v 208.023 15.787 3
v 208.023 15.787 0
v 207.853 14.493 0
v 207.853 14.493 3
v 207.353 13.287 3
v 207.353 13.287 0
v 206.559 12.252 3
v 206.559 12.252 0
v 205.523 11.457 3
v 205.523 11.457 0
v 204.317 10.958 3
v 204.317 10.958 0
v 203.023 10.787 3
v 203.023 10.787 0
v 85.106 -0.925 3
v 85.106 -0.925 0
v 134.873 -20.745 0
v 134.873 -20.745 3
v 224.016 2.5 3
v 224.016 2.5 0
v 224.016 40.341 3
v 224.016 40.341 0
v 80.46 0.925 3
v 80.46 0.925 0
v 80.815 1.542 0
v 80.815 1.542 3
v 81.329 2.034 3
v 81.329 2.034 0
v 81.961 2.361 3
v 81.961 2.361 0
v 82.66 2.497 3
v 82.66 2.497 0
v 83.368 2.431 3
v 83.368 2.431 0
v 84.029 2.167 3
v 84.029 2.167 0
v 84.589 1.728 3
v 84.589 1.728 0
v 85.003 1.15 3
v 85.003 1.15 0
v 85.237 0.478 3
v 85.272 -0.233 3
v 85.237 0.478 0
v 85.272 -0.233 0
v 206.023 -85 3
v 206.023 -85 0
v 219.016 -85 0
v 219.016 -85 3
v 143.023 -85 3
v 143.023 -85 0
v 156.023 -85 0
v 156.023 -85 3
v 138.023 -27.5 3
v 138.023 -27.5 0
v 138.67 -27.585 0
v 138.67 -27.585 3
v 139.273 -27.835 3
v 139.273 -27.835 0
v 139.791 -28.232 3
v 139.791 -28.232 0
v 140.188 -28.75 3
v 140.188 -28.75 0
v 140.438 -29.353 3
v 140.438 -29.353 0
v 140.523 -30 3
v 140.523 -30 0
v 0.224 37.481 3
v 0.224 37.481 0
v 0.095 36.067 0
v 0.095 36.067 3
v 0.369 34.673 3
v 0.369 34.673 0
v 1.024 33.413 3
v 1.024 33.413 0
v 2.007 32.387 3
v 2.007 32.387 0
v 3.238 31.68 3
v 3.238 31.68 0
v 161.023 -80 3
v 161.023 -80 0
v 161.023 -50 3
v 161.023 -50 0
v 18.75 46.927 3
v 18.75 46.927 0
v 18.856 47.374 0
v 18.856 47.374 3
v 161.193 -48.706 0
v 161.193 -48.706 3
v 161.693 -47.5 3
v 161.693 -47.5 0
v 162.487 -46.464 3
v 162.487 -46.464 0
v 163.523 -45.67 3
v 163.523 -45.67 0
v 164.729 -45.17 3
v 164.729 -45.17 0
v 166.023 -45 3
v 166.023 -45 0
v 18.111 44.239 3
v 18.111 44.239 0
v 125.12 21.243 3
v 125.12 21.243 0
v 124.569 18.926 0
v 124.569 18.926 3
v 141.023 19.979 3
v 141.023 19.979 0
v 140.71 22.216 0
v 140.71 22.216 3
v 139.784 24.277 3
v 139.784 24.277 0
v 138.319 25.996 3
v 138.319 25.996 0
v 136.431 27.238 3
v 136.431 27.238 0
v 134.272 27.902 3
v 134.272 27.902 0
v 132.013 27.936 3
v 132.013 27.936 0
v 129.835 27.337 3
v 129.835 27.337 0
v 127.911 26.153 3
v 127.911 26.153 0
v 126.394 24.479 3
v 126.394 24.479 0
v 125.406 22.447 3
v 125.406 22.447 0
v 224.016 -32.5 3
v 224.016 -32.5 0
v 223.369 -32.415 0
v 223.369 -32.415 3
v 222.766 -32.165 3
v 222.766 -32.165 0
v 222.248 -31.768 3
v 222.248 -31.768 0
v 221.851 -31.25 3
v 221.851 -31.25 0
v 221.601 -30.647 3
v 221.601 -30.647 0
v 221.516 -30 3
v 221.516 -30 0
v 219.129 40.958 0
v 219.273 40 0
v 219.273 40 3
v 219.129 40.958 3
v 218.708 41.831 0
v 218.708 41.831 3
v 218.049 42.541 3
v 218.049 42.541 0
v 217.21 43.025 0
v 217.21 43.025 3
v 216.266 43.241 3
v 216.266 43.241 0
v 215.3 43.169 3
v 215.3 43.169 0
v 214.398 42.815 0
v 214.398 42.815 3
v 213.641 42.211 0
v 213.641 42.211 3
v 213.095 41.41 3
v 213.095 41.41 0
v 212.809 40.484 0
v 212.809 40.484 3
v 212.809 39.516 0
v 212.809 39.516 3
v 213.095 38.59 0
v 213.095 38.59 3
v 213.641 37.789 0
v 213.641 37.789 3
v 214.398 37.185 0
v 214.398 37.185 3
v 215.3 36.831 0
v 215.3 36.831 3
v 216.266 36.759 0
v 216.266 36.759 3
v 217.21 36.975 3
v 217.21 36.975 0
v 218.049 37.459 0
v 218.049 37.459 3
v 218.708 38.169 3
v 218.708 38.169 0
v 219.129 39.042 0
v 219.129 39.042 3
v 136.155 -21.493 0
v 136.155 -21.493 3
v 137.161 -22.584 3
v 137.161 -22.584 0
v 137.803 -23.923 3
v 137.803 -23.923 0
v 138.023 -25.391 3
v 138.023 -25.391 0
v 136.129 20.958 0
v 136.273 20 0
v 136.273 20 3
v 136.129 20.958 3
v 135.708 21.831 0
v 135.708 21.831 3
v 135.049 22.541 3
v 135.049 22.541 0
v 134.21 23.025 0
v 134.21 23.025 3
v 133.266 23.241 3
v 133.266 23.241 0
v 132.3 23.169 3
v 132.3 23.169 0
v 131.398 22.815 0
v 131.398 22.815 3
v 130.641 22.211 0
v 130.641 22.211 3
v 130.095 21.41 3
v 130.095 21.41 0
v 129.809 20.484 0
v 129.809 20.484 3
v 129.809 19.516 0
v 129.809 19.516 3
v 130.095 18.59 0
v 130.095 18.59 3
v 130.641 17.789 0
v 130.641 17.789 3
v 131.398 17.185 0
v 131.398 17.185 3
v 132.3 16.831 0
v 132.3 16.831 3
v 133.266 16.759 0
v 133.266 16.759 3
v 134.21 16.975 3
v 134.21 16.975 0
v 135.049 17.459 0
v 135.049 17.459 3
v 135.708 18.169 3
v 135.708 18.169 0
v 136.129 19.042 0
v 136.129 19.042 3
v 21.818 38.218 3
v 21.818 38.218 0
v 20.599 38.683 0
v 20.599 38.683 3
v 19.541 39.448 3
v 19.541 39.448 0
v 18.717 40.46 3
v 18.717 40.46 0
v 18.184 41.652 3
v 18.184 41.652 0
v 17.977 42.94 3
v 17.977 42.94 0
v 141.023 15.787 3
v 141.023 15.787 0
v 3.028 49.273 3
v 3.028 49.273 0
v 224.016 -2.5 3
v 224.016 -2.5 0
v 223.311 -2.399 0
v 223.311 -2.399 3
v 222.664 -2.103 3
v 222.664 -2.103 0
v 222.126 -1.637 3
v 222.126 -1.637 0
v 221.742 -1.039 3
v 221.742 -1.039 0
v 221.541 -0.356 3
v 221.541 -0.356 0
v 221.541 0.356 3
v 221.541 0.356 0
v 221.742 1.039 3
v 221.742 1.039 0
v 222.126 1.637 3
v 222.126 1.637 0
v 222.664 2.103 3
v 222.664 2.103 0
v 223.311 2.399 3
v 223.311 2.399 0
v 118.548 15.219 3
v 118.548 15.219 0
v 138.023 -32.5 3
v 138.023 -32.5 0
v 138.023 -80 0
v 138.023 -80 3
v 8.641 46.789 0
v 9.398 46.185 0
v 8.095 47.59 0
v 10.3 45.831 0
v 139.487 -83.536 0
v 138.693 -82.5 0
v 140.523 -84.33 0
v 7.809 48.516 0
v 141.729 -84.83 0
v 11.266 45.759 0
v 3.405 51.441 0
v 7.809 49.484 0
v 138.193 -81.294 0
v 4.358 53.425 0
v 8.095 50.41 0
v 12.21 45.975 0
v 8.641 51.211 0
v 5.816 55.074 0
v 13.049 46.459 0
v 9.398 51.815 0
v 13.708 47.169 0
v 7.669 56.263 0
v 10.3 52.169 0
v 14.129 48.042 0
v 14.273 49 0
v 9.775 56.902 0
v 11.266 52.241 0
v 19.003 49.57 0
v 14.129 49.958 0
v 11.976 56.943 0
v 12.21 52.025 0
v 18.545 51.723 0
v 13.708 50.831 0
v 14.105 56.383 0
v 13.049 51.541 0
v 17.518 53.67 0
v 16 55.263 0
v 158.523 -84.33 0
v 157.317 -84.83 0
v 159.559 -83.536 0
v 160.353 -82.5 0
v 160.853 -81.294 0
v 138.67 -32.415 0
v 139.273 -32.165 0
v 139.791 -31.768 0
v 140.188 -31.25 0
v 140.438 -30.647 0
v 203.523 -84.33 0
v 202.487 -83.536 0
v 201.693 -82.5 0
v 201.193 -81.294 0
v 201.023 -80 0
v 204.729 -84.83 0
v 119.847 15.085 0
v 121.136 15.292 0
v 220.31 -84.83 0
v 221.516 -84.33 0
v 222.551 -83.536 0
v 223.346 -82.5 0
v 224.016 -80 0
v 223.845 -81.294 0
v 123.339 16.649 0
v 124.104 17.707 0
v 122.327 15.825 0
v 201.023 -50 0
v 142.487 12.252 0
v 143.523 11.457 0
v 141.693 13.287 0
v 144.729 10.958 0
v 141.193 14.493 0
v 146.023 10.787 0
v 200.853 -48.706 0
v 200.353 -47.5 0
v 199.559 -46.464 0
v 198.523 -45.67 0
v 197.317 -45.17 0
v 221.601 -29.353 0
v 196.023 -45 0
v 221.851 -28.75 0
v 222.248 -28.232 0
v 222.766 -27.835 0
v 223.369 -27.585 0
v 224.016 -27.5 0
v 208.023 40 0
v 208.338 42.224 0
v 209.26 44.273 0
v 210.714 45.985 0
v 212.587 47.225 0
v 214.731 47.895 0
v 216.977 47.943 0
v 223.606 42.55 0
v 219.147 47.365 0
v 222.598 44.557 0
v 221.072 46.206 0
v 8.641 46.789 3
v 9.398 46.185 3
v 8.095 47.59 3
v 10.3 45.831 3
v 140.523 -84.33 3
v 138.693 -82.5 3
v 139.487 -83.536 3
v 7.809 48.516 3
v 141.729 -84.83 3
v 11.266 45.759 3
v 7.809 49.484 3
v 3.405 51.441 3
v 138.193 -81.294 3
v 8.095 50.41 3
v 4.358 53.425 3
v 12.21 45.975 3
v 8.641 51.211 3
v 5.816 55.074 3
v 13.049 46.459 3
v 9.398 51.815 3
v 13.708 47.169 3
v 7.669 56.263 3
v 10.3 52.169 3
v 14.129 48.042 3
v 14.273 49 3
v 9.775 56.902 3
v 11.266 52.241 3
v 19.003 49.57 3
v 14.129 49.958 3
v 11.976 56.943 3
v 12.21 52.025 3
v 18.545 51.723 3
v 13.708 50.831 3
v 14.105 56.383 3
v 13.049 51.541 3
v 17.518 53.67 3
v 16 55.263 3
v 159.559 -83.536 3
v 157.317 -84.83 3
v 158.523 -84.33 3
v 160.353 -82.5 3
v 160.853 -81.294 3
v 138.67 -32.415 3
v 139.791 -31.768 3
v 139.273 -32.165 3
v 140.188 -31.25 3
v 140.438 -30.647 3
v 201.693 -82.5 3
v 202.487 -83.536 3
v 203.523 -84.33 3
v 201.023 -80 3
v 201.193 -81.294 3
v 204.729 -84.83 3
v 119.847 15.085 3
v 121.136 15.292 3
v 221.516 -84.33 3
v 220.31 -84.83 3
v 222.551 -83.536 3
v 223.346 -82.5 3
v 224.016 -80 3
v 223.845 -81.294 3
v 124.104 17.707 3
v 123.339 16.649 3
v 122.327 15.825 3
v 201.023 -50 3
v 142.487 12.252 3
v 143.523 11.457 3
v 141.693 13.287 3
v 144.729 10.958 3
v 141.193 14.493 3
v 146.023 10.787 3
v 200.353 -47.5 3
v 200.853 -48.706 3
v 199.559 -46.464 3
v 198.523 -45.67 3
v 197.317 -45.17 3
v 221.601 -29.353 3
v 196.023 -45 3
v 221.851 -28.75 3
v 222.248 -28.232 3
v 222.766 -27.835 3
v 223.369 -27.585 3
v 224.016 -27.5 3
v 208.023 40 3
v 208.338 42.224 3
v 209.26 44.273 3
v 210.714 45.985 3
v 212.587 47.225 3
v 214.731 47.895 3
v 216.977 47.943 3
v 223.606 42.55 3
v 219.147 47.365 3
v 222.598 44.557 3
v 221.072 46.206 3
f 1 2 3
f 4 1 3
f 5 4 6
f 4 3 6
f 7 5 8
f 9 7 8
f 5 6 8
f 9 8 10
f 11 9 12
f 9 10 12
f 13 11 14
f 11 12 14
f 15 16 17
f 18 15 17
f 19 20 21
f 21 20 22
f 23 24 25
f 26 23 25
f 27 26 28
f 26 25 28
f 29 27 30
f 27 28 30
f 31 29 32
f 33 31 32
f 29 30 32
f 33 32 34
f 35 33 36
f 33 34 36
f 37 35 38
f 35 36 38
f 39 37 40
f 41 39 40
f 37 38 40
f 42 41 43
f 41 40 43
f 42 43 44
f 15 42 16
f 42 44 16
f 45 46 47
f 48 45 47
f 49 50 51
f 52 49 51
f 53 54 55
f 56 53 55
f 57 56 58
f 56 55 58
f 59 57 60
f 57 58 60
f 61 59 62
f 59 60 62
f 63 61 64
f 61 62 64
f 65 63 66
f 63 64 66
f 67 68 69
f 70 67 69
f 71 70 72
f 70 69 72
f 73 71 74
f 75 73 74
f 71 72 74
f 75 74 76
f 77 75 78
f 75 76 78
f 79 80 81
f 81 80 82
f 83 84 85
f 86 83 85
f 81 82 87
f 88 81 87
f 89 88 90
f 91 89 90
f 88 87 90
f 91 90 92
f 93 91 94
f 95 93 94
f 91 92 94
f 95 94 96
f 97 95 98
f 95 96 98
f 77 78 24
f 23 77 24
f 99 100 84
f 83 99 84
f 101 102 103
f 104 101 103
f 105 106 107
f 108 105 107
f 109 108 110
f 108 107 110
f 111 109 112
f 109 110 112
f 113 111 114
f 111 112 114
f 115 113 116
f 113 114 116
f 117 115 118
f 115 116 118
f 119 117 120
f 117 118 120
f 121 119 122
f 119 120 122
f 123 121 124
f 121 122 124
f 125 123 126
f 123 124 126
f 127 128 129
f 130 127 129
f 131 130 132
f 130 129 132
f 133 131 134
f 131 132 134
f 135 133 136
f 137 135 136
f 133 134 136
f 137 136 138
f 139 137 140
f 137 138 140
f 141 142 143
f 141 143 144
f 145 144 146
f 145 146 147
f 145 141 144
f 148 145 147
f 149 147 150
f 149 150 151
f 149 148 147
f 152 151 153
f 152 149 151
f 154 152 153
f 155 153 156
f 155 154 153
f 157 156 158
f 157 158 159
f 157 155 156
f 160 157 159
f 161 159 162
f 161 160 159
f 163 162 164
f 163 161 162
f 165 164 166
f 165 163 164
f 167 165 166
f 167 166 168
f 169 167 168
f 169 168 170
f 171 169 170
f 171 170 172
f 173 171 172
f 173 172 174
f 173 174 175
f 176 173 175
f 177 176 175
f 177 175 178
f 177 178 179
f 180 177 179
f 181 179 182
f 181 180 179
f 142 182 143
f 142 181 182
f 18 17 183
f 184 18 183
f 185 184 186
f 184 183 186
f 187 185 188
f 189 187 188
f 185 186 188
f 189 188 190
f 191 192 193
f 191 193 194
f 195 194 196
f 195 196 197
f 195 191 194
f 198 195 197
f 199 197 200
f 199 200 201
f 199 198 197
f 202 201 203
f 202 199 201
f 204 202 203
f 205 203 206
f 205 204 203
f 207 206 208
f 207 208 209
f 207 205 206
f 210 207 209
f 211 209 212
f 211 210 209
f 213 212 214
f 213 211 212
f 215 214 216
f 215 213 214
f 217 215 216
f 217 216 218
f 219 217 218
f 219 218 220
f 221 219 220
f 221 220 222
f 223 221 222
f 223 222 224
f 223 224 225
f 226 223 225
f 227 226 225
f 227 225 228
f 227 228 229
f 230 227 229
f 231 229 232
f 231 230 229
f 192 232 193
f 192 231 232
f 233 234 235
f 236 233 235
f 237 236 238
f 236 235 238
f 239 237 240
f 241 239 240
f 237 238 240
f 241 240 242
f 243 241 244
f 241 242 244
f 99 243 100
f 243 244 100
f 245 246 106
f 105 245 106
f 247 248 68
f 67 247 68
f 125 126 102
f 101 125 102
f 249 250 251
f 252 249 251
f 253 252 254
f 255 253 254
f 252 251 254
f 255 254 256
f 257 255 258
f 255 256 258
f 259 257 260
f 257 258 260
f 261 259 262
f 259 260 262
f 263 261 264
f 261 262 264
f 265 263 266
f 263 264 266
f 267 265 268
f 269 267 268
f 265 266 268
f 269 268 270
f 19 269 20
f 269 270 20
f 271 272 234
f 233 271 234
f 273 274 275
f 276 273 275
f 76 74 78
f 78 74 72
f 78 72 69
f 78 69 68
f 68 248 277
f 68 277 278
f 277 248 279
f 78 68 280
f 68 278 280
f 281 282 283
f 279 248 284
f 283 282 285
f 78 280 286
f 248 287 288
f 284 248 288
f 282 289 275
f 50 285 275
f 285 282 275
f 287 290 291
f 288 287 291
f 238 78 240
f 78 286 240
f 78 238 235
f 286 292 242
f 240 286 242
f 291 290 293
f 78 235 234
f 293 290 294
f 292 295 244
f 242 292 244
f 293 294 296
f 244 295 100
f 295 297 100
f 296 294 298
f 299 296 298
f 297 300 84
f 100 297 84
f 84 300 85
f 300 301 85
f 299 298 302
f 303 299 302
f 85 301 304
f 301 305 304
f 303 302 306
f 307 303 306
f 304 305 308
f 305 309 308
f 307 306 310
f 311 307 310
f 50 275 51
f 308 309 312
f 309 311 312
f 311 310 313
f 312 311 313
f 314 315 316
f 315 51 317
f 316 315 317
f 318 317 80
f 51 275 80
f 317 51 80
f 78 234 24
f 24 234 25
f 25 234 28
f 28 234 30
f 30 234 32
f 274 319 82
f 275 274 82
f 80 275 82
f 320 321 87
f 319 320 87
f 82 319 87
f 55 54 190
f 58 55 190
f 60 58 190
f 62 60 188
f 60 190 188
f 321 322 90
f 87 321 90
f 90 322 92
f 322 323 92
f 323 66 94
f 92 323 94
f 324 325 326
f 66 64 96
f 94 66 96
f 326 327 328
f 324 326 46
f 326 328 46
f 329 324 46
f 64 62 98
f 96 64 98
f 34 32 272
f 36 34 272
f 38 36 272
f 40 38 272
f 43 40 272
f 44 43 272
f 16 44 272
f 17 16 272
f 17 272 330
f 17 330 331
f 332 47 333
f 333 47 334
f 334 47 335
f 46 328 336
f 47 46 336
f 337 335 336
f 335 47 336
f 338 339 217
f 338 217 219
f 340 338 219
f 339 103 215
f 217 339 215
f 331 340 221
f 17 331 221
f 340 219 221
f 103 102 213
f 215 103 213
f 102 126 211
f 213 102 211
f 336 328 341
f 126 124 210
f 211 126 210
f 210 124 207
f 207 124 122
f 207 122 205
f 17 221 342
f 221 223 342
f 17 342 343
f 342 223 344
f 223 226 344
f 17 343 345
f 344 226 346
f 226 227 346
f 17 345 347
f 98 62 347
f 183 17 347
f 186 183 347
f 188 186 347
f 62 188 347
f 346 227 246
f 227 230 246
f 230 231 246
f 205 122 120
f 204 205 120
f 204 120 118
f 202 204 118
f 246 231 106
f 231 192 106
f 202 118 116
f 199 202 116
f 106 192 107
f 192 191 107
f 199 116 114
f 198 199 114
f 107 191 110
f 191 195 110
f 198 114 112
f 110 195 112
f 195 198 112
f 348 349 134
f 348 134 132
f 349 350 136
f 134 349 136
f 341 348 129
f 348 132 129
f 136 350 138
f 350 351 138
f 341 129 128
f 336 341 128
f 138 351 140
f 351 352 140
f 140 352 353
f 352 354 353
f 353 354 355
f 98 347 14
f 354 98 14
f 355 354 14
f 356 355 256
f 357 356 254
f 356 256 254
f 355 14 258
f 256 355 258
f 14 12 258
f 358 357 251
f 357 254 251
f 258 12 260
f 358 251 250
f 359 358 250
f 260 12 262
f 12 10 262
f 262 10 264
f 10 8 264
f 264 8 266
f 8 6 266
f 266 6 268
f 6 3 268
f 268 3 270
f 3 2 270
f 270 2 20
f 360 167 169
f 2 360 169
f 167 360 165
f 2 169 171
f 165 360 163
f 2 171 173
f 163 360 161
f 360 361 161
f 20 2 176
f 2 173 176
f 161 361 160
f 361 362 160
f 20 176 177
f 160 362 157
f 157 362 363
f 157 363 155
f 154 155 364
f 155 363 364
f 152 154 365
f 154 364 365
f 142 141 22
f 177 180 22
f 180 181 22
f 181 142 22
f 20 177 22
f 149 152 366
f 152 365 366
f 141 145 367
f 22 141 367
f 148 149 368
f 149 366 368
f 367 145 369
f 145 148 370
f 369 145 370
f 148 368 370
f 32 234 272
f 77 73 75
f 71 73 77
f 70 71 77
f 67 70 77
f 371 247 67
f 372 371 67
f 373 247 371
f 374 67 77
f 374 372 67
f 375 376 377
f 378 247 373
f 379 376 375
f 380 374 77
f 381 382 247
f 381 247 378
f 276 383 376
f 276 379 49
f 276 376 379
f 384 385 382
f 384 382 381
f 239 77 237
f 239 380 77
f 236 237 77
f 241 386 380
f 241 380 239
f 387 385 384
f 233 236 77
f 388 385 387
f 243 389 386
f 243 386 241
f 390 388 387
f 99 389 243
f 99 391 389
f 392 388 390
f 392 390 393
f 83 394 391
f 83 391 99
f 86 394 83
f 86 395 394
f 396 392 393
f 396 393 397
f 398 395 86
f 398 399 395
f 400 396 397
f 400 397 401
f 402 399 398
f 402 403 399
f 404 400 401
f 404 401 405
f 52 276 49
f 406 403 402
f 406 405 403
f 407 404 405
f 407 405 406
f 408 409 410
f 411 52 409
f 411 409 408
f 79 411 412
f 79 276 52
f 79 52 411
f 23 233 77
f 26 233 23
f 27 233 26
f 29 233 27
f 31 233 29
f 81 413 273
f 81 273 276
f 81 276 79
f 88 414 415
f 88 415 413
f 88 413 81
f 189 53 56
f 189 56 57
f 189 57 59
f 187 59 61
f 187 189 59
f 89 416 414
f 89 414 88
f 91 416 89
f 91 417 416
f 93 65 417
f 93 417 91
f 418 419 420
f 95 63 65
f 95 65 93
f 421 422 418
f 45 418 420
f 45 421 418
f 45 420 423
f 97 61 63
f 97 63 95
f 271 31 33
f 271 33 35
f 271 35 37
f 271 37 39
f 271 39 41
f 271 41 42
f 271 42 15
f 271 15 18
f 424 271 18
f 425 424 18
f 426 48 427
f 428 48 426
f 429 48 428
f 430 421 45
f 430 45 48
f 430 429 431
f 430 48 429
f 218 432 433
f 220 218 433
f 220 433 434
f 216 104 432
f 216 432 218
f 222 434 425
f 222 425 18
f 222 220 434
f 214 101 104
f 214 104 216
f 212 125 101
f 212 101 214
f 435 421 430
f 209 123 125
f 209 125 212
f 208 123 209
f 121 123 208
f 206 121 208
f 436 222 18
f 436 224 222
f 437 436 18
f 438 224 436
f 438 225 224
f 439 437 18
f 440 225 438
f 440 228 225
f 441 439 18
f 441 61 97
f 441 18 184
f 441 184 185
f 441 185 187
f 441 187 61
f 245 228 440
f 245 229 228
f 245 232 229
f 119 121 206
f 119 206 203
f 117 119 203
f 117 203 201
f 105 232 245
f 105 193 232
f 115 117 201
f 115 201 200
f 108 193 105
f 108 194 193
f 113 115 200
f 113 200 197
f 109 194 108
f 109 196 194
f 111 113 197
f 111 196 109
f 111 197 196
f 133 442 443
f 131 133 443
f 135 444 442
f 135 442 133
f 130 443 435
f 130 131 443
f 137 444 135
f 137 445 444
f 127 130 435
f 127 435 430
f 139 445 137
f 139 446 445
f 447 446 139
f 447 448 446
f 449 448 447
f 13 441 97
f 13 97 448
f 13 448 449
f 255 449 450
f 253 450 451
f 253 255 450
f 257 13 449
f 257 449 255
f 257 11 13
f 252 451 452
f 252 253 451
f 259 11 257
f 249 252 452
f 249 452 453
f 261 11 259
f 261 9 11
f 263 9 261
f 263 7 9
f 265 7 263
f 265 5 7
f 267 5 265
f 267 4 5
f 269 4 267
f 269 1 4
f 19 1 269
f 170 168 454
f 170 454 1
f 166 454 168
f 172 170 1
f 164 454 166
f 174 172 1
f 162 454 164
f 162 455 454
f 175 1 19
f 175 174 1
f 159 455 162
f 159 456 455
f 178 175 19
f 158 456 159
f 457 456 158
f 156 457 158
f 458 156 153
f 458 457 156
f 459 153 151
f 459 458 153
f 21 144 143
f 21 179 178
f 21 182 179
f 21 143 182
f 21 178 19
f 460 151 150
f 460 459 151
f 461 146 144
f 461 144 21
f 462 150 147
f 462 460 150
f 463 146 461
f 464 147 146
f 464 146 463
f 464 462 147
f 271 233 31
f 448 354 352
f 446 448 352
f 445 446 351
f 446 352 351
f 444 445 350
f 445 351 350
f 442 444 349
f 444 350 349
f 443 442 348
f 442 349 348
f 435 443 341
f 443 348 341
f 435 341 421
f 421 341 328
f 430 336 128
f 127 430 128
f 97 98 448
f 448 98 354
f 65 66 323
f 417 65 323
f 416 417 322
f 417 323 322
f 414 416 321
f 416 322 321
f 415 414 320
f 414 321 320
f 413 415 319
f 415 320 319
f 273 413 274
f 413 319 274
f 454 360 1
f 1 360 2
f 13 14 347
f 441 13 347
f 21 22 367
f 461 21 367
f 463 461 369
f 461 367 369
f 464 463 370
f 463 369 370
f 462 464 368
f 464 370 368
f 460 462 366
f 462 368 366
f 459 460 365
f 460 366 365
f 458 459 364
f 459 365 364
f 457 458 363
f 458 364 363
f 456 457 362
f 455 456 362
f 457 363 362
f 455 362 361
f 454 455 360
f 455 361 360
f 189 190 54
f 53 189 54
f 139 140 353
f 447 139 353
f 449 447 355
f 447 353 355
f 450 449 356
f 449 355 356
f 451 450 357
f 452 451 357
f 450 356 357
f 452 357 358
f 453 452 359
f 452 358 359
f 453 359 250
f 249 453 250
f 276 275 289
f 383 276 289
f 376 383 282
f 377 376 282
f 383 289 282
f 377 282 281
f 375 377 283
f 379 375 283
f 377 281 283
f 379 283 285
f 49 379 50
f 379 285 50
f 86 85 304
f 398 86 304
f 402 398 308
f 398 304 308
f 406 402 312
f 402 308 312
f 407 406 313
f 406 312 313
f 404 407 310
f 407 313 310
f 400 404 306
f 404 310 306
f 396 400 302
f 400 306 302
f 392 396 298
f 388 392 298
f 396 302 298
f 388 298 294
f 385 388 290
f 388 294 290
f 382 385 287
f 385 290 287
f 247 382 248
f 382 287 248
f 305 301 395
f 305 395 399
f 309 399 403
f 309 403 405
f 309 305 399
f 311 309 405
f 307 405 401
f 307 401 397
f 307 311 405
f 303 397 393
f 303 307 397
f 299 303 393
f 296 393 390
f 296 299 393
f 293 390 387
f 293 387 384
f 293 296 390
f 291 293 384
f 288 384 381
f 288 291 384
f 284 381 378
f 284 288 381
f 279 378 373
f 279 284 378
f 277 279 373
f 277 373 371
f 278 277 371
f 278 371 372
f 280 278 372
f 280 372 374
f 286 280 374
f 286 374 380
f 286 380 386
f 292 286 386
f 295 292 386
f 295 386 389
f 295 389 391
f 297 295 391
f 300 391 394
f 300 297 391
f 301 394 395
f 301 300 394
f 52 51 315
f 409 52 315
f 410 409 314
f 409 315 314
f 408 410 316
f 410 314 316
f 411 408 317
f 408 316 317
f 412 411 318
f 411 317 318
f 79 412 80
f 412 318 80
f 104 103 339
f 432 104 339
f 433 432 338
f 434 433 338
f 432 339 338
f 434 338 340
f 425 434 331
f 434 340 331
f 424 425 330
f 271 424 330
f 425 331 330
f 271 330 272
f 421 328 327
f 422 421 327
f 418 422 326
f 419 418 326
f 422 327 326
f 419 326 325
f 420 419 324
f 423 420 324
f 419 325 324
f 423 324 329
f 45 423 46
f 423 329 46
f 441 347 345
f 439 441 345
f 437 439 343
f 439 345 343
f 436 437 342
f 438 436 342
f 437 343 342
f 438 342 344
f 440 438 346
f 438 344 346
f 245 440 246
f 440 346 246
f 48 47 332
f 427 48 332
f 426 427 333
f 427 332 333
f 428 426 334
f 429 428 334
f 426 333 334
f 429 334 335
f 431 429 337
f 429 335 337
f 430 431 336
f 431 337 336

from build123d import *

# Parameters (mm, degrees)
F0_R     = 3.25
F1_DEPTH = 3


with BuildPart() as f1:
    # F0 (on Top) → F1 (new body)
    with BuildSketch(Plane.XY):
        with BuildLine():
            Line((140.522992, -30), (221.515708, -30))
            ThreePointArc((221.515708, -30), (222.247942, -28.232233), (224.015708, -27.5))
            Line((224.015708, -27.5), (224.015708, -2.5))
            ThreePointArc((224.015708, -2.5), (221.515708, 0), (224.015708, 2.5))
            Line((224.015708, 2.5), (224.015708, 39.658693))
            Line((224.015708, 39.658693), (224.015708, 40.341307))
            ThreePointArc((224.015708, 40.341307), (215.8523, 47.998179), (208.022992, 40))
            Line((208.022992, 40), (208.022992, 15.787397))
            ThreePointArc((208.022992, 15.787397), (206.558526, 12.251863), (203.022992, 10.787397))
            Line((203.022992, 10.787397), (146.022964, 10.787397))
            ThreePointArc((146.022964, 10.787397), (142.48743, 12.251863), (141.022964, 15.787397))
            Line((141.022964, 15.787397), (141.022964, 19.978657))
            ThreePointArc((141.022964, 19.978657), (134.272065, 27.901887), (125.406482, 22.447196))
            Line((125.406482, 22.447196), (125.120118, 21.242808))
            Line((125.120118, 21.242808), (124.569344, 18.926368))
            ThreePointArc((124.569344, 18.926368), (122.326762, 15.825483), (118.54836, 15.218571))
            Line((118.54836, 15.218571), (21.81836, 38.21781))
            ThreePointArc((21.81836, 38.21781), (18.717476, 40.460392), (18.110564, 44.238793))
            Line((18.110564, 44.238793), (18.749643, 46.926629))
            Line((18.749643, 46.926629), (18.855966, 47.3738))
            ThreePointArc((18.855966, 47.3738), (11.975902, 56.943045), (3.027641, 49.272689))
            Line((3.027641, 49.272689), (0.224039, 37.481321))
            ThreePointArc((0.224039, 37.481321), (0.651558, 34.019478), (3.238437, 31.679566))
            Line((3.238437, 31.679566), (80.460392, 0.924996))
            ThreePointArc((80.460392, 0.924996), (83.707969, 2.322581), (85.105555, -0.924996))
            Line((85.105555, -0.924996), (134.872984, -20.745471))
            ThreePointArc((134.872984, -20.745471), (137.161226, -22.584387), (138.022992, -25.390633))
            Line((138.022992, -25.390633), (138.022992, -27.5))
            ThreePointArc((138.022992, -27.5), (139.790759, -28.232233), (140.522992, -30))
        make_face()
        with Locations((11.022992, 49)):
            Circle(F0_R, mode=Mode.SUBTRACT)
        with Locations((133.022992, 20)):
            Circle(F0_R, mode=Mode.SUBTRACT)
        with Locations((216.022992, 40)):
            Circle(F0_R, mode=Mode.SUBTRACT)
        with BuildLine():
            Line((206.022992, -85), (219.015708, -85))
            ThreePointArc((219.015708, -85), (222.551242, -83.535534), (224.015708, -80))
            Line((224.015708, -80), (224.015708, -32.5))
            ThreePointArc((224.015708, -32.5), (222.247942, -31.767767), (221.515708, -30))
            Line((221.515708, -30), (140.522992, -30))
            ThreePointArc((140.522992, -30), (139.790759, -31.767767), (138.022992, -32.5))
            Line((138.022992, -32.5), (138.022992, -80))
            ThreePointArc((138.022992, -80), (139.487459, -83.535534), (143.022992, -85))
            Line((143.022992, -85), (156.022992, -85))
            ThreePointArc((156.022992, -85), (159.558526, -83.535534), (161.022992, -80))
            Line((161.022992, -80), (161.022992, -50))
            ThreePointArc((161.022992, -50), (162.487459, -46.464466), (166.022992, -45))
            Line((166.022992, -45), (196.022992, -45))
            ThreePointArc((196.022992, -45), (199.558526, -46.464466), (201.022992, -50))
            Line((201.022992, -50), (201.022992, -80))
            ThreePointArc((201.022992, -80), (202.487459, -83.535534), (206.022992, -85))
        make_face()
    extrude(amount=F1_DEPTH)


solid = f1.part
